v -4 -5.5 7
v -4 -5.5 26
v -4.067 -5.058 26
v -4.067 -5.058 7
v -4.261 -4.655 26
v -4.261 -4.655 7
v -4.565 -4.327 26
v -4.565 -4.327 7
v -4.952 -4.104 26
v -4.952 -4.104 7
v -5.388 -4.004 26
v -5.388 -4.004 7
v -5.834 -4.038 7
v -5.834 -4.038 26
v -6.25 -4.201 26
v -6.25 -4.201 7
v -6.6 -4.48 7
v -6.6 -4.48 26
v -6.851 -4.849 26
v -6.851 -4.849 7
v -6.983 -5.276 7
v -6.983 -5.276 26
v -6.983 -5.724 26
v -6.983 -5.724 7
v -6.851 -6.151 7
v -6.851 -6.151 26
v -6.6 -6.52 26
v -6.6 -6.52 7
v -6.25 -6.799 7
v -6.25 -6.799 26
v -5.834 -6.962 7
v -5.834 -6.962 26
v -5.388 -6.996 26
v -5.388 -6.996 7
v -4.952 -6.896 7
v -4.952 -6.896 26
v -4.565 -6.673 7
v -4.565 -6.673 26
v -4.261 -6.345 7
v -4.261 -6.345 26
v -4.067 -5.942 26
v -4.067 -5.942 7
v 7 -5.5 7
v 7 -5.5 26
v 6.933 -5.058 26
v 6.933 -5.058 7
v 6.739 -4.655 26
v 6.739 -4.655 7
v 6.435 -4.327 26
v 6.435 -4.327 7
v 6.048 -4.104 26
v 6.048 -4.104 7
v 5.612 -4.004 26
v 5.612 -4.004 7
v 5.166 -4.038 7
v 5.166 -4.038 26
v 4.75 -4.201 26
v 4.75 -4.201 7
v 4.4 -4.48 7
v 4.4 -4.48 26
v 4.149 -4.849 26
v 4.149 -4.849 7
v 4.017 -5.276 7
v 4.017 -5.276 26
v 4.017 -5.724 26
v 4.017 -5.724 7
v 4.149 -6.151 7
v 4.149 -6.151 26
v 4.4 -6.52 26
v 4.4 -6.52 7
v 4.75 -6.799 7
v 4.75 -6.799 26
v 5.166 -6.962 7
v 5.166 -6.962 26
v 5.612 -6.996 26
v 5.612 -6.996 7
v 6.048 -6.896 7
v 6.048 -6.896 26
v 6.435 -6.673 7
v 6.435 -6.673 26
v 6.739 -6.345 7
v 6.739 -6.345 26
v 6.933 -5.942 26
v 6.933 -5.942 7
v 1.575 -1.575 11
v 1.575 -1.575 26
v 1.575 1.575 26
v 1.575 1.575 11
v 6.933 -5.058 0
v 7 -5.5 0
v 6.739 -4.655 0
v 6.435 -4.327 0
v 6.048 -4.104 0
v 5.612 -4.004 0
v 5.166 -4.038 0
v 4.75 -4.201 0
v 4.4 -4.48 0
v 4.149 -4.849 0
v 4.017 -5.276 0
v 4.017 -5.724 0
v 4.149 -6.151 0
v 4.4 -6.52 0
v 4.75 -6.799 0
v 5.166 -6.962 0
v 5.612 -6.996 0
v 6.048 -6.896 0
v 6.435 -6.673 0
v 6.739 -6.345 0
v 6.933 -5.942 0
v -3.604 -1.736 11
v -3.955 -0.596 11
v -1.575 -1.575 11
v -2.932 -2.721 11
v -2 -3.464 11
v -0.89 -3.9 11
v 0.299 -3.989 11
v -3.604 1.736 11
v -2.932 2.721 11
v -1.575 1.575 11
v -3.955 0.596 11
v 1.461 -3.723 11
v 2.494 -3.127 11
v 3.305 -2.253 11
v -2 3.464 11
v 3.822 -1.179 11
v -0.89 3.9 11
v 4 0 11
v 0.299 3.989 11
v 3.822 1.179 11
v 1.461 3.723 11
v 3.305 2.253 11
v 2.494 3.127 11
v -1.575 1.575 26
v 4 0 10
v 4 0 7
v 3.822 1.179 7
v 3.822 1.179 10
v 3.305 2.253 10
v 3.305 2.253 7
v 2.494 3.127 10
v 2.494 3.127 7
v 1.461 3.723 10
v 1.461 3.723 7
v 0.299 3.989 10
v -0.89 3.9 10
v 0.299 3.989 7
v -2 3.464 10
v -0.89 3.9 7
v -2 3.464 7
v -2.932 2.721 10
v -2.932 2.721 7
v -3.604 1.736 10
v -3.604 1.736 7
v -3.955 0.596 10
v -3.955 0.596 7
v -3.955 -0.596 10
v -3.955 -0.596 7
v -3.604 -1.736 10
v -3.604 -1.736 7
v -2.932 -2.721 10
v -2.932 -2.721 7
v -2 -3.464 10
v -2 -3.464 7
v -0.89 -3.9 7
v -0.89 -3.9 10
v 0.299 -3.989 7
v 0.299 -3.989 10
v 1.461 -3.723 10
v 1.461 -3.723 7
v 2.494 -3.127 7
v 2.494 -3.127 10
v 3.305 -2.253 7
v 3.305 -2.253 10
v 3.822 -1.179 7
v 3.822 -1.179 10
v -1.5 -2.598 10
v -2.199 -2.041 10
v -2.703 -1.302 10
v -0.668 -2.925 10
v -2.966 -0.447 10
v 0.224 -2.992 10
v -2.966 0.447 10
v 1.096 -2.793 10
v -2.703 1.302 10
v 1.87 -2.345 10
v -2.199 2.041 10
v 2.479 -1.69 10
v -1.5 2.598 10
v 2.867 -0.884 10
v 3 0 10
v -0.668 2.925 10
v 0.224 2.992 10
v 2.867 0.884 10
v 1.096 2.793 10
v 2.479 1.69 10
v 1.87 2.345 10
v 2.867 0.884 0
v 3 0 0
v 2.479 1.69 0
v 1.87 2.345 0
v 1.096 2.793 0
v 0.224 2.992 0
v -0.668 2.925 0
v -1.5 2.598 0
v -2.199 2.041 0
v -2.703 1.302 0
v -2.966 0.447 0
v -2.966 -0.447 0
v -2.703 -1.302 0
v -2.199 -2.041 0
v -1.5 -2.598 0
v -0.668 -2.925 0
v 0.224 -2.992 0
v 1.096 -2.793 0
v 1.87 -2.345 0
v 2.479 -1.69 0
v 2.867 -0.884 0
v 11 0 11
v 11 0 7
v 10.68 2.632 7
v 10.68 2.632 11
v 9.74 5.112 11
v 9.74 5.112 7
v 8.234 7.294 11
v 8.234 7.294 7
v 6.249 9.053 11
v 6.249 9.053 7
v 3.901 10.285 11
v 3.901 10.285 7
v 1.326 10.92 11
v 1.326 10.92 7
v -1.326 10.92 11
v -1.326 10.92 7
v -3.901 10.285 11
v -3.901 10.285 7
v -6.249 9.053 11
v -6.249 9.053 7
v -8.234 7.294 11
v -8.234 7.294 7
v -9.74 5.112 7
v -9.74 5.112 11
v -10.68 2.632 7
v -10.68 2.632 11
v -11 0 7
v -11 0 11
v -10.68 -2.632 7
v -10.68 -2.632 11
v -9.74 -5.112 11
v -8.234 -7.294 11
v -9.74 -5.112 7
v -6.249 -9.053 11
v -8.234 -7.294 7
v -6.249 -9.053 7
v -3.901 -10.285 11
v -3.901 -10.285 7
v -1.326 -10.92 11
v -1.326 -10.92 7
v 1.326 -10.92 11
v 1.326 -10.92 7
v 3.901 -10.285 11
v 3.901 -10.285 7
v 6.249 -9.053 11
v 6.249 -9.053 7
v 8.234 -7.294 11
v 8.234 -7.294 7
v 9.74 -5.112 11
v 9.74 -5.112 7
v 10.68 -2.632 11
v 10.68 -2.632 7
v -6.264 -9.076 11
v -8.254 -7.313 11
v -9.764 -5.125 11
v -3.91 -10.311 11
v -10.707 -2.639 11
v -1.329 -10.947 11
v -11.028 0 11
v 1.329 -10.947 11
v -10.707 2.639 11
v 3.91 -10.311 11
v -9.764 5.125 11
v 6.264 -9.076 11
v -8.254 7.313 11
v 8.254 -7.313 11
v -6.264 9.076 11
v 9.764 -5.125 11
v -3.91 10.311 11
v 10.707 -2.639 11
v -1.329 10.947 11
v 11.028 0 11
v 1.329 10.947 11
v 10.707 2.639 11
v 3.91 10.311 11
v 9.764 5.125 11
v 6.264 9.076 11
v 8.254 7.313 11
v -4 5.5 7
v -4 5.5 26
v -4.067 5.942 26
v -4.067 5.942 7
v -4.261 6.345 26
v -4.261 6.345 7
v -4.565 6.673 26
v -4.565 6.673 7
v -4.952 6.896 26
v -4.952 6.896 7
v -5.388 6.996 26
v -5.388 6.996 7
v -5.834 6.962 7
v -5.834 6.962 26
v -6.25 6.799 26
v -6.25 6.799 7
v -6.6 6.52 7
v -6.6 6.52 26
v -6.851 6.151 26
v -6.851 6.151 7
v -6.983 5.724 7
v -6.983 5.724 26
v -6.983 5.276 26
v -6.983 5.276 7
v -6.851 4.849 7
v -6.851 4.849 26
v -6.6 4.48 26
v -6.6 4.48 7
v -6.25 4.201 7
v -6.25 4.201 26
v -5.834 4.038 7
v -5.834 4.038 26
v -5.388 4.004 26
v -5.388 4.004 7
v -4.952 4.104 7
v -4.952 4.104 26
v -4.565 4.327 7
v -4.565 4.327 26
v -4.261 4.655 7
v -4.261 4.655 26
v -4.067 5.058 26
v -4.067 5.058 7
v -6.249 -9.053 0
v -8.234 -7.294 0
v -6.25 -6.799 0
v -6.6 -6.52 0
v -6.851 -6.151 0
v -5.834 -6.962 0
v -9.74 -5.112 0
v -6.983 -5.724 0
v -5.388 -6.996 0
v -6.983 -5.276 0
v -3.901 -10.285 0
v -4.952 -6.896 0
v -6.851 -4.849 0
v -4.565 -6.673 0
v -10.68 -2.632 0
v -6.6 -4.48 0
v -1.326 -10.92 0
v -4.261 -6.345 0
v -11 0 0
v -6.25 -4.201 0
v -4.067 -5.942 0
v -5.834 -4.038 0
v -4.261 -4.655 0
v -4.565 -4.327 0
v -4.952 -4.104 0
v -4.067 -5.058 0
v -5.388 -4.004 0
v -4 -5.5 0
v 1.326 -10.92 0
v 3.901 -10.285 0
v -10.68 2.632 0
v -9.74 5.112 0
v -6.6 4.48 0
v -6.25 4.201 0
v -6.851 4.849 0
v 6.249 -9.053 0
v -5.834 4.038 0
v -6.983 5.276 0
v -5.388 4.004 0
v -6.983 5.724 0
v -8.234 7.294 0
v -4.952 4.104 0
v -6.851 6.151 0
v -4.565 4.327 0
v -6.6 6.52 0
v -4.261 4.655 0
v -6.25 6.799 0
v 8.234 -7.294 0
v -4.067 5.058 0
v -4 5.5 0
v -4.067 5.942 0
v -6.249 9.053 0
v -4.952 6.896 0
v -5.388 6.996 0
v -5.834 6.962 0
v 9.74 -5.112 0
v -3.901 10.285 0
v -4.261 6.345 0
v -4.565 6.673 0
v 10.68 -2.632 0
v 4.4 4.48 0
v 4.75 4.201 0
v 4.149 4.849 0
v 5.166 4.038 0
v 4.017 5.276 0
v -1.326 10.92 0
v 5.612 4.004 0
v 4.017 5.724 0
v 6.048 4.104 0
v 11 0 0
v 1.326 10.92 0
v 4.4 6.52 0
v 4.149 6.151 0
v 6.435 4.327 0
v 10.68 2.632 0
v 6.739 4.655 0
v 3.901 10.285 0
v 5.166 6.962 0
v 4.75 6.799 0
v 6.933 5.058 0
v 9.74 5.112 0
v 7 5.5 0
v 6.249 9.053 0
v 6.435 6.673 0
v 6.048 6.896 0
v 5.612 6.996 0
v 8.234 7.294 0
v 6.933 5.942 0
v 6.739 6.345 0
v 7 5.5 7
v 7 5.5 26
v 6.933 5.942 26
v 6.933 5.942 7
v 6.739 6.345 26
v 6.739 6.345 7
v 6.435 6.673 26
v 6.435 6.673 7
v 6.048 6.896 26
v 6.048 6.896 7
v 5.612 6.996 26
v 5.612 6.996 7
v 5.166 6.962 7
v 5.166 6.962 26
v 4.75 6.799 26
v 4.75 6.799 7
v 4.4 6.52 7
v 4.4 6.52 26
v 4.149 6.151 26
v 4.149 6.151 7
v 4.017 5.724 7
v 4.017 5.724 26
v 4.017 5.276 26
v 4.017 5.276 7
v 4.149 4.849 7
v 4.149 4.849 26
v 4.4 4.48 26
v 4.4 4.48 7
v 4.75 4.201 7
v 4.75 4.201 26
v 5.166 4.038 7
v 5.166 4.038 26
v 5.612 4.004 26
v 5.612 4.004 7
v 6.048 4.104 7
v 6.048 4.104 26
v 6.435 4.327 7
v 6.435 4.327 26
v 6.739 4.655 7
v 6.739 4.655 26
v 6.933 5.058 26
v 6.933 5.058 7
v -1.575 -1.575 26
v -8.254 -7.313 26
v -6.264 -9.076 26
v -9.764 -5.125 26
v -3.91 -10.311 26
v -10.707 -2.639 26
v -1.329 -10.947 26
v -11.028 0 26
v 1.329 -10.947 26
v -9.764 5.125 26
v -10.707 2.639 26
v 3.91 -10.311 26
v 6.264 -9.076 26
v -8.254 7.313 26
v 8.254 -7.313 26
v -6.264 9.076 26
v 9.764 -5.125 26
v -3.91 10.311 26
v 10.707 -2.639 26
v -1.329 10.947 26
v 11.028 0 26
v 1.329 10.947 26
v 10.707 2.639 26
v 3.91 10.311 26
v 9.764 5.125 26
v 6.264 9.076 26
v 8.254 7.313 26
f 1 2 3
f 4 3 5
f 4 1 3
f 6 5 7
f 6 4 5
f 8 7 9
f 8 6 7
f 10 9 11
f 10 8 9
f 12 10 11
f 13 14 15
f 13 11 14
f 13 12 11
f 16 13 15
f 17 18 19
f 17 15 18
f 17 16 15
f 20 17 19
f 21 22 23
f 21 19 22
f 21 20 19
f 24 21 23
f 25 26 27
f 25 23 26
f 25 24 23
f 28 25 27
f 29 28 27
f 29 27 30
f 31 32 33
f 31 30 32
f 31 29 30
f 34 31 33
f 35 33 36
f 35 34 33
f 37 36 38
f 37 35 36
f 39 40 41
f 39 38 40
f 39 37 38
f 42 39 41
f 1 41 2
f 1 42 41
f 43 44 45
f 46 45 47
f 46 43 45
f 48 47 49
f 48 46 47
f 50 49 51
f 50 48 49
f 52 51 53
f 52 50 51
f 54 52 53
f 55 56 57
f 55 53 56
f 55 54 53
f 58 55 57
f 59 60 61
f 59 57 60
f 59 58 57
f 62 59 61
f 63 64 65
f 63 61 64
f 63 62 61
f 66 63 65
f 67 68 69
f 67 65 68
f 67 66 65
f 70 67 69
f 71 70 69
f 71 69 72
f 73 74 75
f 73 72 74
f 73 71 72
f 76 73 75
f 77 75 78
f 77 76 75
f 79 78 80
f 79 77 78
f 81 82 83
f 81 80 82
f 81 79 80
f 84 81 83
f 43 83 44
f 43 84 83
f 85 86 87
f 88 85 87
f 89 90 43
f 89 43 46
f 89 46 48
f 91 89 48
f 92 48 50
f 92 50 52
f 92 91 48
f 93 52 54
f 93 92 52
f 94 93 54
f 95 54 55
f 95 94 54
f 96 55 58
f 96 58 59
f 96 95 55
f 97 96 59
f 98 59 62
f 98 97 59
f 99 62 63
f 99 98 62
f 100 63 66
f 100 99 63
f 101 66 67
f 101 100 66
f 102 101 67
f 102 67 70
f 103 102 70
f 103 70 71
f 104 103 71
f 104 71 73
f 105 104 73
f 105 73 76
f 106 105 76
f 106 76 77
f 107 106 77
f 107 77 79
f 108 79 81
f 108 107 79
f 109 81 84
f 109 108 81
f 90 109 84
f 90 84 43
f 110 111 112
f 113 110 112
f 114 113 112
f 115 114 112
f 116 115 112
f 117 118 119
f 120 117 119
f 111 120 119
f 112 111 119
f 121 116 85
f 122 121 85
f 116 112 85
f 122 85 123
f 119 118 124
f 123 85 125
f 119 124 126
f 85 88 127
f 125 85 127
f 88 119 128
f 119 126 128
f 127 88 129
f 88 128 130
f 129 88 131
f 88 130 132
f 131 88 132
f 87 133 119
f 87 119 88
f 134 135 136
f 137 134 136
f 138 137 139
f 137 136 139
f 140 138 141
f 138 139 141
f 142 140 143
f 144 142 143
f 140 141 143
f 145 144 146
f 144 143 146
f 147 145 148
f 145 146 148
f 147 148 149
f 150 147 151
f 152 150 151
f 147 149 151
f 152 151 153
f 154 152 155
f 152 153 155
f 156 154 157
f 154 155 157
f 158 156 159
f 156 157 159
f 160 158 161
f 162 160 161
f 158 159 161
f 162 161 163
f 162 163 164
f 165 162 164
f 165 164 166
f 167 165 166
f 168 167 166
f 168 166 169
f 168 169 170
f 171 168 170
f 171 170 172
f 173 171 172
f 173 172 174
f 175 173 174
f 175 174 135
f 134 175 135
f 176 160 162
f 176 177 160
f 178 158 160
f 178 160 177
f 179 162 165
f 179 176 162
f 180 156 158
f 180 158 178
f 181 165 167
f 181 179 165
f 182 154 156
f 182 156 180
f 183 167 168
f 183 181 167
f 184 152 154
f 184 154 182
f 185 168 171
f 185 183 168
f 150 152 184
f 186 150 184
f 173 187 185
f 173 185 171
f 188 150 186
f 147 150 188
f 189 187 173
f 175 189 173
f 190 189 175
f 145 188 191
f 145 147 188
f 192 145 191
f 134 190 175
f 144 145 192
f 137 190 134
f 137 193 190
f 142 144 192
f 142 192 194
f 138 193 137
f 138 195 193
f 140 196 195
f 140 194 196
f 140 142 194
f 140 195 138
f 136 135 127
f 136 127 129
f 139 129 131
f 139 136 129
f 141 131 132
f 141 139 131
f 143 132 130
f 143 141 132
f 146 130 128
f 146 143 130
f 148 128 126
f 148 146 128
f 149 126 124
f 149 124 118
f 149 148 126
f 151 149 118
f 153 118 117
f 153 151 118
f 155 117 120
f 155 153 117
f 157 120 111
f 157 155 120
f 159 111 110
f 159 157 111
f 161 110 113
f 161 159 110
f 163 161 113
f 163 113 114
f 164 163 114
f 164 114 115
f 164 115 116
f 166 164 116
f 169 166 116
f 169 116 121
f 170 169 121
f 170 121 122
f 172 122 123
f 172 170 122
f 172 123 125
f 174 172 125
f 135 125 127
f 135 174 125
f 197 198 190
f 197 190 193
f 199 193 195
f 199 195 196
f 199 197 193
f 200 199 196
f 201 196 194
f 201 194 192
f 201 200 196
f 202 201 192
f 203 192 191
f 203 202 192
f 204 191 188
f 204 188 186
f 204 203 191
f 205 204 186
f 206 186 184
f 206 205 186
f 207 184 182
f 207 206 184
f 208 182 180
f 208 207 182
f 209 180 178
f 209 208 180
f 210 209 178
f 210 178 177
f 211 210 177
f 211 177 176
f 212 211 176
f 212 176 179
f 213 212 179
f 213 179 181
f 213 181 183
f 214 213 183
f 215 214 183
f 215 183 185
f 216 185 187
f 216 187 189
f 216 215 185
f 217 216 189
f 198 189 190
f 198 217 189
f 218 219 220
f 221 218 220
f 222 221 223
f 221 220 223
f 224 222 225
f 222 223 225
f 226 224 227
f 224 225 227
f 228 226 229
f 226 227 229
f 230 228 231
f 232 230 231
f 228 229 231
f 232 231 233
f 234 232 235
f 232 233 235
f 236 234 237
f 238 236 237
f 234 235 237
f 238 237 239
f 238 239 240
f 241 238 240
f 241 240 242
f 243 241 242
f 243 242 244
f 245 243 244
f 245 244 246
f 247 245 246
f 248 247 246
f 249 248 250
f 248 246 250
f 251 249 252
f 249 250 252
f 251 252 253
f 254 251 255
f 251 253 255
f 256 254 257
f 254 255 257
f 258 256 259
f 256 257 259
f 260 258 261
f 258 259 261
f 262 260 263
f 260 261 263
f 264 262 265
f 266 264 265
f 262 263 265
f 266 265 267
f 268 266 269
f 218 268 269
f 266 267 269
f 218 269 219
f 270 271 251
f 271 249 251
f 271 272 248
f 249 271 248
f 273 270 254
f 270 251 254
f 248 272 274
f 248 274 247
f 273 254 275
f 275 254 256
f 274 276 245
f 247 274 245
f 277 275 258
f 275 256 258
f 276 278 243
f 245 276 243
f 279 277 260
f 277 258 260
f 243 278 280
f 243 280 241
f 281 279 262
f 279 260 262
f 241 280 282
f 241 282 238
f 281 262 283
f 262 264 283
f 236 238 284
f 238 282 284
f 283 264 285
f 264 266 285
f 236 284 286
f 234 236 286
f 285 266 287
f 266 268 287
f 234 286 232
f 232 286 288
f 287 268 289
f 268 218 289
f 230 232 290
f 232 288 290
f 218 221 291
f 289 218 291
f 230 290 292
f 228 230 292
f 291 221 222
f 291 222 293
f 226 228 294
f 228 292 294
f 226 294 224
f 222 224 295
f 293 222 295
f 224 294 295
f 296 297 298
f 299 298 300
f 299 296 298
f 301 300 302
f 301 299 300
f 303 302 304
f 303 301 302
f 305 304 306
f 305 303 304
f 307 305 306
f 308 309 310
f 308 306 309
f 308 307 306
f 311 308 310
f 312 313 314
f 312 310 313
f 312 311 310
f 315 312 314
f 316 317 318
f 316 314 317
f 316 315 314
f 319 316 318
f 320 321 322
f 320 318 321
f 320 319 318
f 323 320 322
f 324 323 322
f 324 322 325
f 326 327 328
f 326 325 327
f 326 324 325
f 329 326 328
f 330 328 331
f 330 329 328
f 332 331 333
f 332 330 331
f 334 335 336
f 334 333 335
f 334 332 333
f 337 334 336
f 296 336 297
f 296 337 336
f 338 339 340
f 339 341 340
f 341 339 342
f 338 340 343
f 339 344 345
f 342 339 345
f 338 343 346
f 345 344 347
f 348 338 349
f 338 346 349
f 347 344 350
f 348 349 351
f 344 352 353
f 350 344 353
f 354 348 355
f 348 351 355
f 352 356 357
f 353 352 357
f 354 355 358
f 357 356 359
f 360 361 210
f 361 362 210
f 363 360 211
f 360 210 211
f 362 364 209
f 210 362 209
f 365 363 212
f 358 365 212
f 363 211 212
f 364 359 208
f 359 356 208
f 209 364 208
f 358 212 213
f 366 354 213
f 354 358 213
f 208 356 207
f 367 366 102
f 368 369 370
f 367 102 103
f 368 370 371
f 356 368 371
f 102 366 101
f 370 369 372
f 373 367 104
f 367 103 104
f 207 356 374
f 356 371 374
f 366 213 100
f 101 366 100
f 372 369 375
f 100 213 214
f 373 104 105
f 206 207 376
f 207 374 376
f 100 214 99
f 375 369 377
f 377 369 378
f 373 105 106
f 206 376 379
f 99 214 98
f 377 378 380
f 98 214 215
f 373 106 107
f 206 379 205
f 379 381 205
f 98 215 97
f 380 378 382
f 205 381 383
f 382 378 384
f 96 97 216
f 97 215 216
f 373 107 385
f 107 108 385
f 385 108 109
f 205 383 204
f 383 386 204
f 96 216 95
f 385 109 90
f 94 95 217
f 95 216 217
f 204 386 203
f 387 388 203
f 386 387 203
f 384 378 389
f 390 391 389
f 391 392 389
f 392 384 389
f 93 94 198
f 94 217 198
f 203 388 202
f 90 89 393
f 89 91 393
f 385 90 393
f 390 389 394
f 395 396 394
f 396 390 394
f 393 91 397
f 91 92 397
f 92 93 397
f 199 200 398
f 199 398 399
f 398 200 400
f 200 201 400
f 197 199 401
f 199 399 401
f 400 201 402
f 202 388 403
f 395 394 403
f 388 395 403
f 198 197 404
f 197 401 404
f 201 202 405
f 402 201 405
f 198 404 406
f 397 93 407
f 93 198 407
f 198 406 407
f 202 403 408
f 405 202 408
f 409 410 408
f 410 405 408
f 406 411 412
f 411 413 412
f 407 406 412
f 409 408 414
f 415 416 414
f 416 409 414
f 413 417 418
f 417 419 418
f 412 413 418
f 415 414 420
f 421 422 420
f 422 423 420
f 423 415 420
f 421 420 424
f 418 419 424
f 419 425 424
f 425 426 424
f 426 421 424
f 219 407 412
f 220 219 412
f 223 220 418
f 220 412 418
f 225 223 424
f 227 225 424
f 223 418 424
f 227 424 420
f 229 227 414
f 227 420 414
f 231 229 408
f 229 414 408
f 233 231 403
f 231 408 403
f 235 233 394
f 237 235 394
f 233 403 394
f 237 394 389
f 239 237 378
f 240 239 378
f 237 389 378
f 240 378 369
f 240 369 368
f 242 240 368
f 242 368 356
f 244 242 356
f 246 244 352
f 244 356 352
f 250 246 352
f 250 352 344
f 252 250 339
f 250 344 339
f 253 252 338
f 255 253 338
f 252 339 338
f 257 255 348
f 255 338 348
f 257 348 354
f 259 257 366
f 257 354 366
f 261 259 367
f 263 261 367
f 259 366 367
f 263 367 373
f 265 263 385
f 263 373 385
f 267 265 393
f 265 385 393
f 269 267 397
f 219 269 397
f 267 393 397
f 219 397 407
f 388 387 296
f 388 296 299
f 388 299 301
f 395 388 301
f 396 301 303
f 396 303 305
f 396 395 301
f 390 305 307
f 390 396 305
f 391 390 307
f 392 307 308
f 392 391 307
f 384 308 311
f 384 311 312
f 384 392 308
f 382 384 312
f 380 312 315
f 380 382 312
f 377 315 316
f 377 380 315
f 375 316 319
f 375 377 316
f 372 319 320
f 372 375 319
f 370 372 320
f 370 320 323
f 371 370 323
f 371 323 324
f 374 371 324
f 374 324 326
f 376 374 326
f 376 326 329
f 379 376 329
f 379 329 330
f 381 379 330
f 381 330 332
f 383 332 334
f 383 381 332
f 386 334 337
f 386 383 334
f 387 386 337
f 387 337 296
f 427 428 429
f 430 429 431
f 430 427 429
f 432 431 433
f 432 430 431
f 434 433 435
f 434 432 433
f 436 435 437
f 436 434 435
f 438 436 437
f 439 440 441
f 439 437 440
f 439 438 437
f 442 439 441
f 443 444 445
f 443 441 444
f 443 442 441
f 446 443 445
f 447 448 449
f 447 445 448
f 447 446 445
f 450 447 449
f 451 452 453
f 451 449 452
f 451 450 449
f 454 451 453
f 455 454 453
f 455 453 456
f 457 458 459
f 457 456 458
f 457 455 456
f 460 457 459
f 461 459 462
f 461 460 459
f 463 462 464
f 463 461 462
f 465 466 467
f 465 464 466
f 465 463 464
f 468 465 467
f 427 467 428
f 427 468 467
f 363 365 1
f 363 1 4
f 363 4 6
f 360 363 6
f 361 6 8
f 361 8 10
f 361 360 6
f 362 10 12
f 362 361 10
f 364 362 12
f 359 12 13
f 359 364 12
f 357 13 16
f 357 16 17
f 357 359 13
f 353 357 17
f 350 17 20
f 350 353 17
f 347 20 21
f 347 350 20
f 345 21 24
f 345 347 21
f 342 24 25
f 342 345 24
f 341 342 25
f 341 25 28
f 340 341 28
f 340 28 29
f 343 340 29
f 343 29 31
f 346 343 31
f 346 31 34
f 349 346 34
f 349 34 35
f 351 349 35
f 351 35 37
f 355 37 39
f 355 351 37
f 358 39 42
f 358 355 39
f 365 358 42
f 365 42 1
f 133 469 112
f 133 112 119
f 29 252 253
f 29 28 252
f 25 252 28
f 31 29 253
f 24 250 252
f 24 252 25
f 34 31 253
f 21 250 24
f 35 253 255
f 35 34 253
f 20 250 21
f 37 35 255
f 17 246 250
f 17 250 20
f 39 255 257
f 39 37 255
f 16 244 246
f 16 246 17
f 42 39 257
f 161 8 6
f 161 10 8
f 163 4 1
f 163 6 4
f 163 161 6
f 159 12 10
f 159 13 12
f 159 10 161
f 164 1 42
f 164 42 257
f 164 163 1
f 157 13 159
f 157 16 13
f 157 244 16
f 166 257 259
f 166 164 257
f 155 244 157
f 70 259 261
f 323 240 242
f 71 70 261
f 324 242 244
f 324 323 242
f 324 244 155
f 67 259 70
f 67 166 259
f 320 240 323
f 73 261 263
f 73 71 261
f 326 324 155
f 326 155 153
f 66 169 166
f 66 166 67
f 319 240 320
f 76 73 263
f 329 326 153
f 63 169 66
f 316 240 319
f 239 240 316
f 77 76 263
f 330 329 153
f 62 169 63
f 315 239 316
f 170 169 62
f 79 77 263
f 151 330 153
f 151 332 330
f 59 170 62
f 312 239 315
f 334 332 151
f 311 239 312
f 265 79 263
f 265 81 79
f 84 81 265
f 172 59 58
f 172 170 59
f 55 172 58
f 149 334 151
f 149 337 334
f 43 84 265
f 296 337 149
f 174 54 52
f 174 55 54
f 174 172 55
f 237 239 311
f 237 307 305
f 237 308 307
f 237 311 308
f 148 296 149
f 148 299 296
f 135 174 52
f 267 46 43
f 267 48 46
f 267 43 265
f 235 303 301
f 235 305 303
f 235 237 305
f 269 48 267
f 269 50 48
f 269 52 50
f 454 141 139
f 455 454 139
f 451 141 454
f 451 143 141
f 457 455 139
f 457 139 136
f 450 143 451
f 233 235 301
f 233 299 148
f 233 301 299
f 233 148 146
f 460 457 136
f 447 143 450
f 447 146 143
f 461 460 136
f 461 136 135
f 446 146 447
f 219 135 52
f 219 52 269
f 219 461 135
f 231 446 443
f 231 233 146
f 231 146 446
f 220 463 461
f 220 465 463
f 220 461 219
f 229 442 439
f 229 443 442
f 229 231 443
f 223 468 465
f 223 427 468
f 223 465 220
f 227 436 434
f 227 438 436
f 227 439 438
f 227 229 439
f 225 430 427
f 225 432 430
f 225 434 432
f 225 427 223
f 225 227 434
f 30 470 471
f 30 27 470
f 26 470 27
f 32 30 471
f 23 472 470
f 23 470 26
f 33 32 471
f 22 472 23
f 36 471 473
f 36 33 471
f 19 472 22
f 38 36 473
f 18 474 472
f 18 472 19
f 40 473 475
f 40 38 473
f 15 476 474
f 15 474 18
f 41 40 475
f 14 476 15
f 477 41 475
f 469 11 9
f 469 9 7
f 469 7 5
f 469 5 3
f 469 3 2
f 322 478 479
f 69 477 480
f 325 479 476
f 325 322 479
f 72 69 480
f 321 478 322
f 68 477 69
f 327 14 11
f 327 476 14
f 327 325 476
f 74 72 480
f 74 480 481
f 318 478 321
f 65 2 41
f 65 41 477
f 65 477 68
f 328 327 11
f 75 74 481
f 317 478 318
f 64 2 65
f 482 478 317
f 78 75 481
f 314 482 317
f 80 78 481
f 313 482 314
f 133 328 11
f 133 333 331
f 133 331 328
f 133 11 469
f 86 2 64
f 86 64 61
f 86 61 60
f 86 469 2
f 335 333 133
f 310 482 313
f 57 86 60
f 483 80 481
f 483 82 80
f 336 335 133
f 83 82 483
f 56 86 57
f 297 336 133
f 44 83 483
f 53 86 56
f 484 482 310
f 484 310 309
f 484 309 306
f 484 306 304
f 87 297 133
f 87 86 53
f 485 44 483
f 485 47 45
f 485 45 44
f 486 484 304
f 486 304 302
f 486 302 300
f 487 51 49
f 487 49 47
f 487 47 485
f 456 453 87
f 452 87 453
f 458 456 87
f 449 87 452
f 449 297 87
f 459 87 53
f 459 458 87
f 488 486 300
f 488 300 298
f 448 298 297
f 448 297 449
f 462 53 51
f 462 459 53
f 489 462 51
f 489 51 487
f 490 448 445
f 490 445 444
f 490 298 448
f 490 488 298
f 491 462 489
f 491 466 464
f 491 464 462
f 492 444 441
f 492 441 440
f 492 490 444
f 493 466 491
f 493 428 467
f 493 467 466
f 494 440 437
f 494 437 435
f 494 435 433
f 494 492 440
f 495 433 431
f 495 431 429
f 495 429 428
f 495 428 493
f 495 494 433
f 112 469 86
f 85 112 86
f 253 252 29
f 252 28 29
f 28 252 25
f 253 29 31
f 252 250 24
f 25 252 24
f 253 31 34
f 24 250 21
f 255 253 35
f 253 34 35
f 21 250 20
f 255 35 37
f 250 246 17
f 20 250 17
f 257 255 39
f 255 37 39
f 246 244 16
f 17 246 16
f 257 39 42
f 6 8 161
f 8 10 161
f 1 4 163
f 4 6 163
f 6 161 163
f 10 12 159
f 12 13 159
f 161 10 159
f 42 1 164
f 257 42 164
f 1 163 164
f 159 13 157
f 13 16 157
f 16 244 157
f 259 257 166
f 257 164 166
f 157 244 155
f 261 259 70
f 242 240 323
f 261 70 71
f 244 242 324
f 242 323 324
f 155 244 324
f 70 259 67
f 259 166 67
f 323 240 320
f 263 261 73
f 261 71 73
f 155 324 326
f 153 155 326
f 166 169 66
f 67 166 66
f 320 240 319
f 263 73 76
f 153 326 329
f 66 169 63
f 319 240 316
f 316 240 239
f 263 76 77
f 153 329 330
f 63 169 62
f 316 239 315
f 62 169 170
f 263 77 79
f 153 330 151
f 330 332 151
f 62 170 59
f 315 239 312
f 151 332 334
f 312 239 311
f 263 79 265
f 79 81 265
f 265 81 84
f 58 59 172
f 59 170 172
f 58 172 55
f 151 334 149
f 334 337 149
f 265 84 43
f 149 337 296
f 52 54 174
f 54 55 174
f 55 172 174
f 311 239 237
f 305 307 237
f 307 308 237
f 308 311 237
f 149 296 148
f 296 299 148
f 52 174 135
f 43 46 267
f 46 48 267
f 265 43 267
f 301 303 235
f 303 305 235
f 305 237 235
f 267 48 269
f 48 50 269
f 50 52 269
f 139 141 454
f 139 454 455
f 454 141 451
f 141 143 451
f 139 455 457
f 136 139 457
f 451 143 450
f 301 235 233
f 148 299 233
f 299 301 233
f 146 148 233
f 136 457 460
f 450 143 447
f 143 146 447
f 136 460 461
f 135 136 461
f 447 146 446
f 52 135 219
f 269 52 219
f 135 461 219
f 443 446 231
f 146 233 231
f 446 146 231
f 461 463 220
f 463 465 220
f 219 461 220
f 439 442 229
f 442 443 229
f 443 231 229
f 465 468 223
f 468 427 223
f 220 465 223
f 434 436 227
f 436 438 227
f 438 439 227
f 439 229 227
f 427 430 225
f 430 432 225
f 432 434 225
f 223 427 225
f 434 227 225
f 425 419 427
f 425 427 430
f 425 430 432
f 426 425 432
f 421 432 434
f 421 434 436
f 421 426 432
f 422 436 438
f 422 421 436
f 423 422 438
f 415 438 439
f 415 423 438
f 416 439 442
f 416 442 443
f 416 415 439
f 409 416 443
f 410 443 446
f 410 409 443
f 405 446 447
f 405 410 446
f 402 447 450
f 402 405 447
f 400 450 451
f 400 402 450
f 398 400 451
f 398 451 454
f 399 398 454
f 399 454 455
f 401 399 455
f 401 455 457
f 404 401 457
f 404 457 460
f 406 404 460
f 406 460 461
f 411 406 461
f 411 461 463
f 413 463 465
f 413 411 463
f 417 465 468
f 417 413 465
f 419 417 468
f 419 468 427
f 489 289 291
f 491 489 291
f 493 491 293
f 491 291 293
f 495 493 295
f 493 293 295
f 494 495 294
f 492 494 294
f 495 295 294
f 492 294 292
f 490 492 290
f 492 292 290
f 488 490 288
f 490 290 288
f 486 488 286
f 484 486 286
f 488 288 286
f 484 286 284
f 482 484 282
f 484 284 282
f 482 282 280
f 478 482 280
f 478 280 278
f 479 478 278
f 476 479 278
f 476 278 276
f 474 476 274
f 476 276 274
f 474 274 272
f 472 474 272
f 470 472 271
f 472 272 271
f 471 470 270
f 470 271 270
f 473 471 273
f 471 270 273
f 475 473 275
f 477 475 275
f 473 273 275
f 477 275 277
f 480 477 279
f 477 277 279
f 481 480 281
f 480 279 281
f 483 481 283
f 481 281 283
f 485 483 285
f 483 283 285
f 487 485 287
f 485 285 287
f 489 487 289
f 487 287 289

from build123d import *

# Parameters (mm, degrees)
F0_R     = 11
F0_R_2   = 1.5
F0_R_3   = 4
F1_DEPTH = 7
F0_R_4   = 3
F2_DEPTH = 10
F3_R     = 11
F3_R_2   = 1.5
F3_R_3   = 4
F4_DEPTH = 4
F5_R     = 11.02763
F6_DEPTH = 15
F7_W     = 3.15
F7_H     = 3.15
F8_DEPTH = 16.3
F5_R_2   = 1.5
F9_DEPTH = 46.4


with BuildPart() as f1:
    # F0 (on Top) → F1 (new body)
    with BuildSketch(Plane.XY):
        Circle(F0_R)
        with Locations((-5.5, -5.5)):
            Circle(F0_R_2, mode=Mode.SUBTRACT)
        with Locations((5.5, -5.5)):
            Circle(F0_R_2, mode=Mode.SUBTRACT)
        with Locations((-5.5, 5.5)):
            Circle(F0_R_2, mode=Mode.SUBTRACT)
        Circle(F0_R_3, mode=Mode.SUBTRACT)
        with Locations((5.5, 5.5)):
            Circle(F0_R_2, mode=Mode.SUBTRACT)
    extrude(amount=F1_DEPTH)

    # F0 (on Top) → F2 (join)
    with BuildSketch(Plane.XY):
        Circle(F0_R_3)
        Circle(F0_R_4, mode=Mode.SUBTRACT)
    extrude(amount=F2_DEPTH)


with BuildPart() as f4:
    # F3 (on face) → F4 (new body)
    with BuildSketch(Plane.XY.offset(7)):
        Circle(F3_R)
        with Locations((-5.5, -5.5)):
            Circle(F3_R_2, mode=Mode.SUBTRACT)
        with Locations((5.5, -5.5)):
            Circle(F3_R_2, mode=Mode.SUBTRACT)
        with Locations((-5.5, 5.5)):
            Circle(F3_R_2, mode=Mode.SUBTRACT)
        Circle(F3_R_3, mode=Mode.SUBTRACT)
        with Locations((5.5, 5.5)):
            Circle(F3_R_2, mode=Mode.SUBTRACT)
    extrude(amount=F4_DEPTH)

    # F5 (on face) → F6 (join)
    with BuildSketch(Plane.XY.offset(11)):
        Circle(F5_R)
    extrude(amount=F6_DEPTH)

    # F7 (on face) → F8 (cut)
    with BuildSketch(Plane.XY.offset(26)):
        Rectangle(F7_W, F7_H)
    extrude(amount=-F8_DEPTH, mode=Mode.SUBTRACT)

    # F5 (on face) → F9 (cut)
    with BuildSketch(Plane.XY.offset(11)):
        with Locations((-5.5, 5.5)):
            Circle(F5_R_2)
        with Locations((5.5, 5.5)):
            Circle(F5_R_2)
        with Locations((5.5, -5.5)):
            Circle(F5_R_2)
        with Locations((-5.5, -5.5)):
            Circle(F5_R_2)
    extrude(amount=F9_DEPTH, mode=Mode.SUBTRACT)


solid = Compound([f1.part, f4.part])
